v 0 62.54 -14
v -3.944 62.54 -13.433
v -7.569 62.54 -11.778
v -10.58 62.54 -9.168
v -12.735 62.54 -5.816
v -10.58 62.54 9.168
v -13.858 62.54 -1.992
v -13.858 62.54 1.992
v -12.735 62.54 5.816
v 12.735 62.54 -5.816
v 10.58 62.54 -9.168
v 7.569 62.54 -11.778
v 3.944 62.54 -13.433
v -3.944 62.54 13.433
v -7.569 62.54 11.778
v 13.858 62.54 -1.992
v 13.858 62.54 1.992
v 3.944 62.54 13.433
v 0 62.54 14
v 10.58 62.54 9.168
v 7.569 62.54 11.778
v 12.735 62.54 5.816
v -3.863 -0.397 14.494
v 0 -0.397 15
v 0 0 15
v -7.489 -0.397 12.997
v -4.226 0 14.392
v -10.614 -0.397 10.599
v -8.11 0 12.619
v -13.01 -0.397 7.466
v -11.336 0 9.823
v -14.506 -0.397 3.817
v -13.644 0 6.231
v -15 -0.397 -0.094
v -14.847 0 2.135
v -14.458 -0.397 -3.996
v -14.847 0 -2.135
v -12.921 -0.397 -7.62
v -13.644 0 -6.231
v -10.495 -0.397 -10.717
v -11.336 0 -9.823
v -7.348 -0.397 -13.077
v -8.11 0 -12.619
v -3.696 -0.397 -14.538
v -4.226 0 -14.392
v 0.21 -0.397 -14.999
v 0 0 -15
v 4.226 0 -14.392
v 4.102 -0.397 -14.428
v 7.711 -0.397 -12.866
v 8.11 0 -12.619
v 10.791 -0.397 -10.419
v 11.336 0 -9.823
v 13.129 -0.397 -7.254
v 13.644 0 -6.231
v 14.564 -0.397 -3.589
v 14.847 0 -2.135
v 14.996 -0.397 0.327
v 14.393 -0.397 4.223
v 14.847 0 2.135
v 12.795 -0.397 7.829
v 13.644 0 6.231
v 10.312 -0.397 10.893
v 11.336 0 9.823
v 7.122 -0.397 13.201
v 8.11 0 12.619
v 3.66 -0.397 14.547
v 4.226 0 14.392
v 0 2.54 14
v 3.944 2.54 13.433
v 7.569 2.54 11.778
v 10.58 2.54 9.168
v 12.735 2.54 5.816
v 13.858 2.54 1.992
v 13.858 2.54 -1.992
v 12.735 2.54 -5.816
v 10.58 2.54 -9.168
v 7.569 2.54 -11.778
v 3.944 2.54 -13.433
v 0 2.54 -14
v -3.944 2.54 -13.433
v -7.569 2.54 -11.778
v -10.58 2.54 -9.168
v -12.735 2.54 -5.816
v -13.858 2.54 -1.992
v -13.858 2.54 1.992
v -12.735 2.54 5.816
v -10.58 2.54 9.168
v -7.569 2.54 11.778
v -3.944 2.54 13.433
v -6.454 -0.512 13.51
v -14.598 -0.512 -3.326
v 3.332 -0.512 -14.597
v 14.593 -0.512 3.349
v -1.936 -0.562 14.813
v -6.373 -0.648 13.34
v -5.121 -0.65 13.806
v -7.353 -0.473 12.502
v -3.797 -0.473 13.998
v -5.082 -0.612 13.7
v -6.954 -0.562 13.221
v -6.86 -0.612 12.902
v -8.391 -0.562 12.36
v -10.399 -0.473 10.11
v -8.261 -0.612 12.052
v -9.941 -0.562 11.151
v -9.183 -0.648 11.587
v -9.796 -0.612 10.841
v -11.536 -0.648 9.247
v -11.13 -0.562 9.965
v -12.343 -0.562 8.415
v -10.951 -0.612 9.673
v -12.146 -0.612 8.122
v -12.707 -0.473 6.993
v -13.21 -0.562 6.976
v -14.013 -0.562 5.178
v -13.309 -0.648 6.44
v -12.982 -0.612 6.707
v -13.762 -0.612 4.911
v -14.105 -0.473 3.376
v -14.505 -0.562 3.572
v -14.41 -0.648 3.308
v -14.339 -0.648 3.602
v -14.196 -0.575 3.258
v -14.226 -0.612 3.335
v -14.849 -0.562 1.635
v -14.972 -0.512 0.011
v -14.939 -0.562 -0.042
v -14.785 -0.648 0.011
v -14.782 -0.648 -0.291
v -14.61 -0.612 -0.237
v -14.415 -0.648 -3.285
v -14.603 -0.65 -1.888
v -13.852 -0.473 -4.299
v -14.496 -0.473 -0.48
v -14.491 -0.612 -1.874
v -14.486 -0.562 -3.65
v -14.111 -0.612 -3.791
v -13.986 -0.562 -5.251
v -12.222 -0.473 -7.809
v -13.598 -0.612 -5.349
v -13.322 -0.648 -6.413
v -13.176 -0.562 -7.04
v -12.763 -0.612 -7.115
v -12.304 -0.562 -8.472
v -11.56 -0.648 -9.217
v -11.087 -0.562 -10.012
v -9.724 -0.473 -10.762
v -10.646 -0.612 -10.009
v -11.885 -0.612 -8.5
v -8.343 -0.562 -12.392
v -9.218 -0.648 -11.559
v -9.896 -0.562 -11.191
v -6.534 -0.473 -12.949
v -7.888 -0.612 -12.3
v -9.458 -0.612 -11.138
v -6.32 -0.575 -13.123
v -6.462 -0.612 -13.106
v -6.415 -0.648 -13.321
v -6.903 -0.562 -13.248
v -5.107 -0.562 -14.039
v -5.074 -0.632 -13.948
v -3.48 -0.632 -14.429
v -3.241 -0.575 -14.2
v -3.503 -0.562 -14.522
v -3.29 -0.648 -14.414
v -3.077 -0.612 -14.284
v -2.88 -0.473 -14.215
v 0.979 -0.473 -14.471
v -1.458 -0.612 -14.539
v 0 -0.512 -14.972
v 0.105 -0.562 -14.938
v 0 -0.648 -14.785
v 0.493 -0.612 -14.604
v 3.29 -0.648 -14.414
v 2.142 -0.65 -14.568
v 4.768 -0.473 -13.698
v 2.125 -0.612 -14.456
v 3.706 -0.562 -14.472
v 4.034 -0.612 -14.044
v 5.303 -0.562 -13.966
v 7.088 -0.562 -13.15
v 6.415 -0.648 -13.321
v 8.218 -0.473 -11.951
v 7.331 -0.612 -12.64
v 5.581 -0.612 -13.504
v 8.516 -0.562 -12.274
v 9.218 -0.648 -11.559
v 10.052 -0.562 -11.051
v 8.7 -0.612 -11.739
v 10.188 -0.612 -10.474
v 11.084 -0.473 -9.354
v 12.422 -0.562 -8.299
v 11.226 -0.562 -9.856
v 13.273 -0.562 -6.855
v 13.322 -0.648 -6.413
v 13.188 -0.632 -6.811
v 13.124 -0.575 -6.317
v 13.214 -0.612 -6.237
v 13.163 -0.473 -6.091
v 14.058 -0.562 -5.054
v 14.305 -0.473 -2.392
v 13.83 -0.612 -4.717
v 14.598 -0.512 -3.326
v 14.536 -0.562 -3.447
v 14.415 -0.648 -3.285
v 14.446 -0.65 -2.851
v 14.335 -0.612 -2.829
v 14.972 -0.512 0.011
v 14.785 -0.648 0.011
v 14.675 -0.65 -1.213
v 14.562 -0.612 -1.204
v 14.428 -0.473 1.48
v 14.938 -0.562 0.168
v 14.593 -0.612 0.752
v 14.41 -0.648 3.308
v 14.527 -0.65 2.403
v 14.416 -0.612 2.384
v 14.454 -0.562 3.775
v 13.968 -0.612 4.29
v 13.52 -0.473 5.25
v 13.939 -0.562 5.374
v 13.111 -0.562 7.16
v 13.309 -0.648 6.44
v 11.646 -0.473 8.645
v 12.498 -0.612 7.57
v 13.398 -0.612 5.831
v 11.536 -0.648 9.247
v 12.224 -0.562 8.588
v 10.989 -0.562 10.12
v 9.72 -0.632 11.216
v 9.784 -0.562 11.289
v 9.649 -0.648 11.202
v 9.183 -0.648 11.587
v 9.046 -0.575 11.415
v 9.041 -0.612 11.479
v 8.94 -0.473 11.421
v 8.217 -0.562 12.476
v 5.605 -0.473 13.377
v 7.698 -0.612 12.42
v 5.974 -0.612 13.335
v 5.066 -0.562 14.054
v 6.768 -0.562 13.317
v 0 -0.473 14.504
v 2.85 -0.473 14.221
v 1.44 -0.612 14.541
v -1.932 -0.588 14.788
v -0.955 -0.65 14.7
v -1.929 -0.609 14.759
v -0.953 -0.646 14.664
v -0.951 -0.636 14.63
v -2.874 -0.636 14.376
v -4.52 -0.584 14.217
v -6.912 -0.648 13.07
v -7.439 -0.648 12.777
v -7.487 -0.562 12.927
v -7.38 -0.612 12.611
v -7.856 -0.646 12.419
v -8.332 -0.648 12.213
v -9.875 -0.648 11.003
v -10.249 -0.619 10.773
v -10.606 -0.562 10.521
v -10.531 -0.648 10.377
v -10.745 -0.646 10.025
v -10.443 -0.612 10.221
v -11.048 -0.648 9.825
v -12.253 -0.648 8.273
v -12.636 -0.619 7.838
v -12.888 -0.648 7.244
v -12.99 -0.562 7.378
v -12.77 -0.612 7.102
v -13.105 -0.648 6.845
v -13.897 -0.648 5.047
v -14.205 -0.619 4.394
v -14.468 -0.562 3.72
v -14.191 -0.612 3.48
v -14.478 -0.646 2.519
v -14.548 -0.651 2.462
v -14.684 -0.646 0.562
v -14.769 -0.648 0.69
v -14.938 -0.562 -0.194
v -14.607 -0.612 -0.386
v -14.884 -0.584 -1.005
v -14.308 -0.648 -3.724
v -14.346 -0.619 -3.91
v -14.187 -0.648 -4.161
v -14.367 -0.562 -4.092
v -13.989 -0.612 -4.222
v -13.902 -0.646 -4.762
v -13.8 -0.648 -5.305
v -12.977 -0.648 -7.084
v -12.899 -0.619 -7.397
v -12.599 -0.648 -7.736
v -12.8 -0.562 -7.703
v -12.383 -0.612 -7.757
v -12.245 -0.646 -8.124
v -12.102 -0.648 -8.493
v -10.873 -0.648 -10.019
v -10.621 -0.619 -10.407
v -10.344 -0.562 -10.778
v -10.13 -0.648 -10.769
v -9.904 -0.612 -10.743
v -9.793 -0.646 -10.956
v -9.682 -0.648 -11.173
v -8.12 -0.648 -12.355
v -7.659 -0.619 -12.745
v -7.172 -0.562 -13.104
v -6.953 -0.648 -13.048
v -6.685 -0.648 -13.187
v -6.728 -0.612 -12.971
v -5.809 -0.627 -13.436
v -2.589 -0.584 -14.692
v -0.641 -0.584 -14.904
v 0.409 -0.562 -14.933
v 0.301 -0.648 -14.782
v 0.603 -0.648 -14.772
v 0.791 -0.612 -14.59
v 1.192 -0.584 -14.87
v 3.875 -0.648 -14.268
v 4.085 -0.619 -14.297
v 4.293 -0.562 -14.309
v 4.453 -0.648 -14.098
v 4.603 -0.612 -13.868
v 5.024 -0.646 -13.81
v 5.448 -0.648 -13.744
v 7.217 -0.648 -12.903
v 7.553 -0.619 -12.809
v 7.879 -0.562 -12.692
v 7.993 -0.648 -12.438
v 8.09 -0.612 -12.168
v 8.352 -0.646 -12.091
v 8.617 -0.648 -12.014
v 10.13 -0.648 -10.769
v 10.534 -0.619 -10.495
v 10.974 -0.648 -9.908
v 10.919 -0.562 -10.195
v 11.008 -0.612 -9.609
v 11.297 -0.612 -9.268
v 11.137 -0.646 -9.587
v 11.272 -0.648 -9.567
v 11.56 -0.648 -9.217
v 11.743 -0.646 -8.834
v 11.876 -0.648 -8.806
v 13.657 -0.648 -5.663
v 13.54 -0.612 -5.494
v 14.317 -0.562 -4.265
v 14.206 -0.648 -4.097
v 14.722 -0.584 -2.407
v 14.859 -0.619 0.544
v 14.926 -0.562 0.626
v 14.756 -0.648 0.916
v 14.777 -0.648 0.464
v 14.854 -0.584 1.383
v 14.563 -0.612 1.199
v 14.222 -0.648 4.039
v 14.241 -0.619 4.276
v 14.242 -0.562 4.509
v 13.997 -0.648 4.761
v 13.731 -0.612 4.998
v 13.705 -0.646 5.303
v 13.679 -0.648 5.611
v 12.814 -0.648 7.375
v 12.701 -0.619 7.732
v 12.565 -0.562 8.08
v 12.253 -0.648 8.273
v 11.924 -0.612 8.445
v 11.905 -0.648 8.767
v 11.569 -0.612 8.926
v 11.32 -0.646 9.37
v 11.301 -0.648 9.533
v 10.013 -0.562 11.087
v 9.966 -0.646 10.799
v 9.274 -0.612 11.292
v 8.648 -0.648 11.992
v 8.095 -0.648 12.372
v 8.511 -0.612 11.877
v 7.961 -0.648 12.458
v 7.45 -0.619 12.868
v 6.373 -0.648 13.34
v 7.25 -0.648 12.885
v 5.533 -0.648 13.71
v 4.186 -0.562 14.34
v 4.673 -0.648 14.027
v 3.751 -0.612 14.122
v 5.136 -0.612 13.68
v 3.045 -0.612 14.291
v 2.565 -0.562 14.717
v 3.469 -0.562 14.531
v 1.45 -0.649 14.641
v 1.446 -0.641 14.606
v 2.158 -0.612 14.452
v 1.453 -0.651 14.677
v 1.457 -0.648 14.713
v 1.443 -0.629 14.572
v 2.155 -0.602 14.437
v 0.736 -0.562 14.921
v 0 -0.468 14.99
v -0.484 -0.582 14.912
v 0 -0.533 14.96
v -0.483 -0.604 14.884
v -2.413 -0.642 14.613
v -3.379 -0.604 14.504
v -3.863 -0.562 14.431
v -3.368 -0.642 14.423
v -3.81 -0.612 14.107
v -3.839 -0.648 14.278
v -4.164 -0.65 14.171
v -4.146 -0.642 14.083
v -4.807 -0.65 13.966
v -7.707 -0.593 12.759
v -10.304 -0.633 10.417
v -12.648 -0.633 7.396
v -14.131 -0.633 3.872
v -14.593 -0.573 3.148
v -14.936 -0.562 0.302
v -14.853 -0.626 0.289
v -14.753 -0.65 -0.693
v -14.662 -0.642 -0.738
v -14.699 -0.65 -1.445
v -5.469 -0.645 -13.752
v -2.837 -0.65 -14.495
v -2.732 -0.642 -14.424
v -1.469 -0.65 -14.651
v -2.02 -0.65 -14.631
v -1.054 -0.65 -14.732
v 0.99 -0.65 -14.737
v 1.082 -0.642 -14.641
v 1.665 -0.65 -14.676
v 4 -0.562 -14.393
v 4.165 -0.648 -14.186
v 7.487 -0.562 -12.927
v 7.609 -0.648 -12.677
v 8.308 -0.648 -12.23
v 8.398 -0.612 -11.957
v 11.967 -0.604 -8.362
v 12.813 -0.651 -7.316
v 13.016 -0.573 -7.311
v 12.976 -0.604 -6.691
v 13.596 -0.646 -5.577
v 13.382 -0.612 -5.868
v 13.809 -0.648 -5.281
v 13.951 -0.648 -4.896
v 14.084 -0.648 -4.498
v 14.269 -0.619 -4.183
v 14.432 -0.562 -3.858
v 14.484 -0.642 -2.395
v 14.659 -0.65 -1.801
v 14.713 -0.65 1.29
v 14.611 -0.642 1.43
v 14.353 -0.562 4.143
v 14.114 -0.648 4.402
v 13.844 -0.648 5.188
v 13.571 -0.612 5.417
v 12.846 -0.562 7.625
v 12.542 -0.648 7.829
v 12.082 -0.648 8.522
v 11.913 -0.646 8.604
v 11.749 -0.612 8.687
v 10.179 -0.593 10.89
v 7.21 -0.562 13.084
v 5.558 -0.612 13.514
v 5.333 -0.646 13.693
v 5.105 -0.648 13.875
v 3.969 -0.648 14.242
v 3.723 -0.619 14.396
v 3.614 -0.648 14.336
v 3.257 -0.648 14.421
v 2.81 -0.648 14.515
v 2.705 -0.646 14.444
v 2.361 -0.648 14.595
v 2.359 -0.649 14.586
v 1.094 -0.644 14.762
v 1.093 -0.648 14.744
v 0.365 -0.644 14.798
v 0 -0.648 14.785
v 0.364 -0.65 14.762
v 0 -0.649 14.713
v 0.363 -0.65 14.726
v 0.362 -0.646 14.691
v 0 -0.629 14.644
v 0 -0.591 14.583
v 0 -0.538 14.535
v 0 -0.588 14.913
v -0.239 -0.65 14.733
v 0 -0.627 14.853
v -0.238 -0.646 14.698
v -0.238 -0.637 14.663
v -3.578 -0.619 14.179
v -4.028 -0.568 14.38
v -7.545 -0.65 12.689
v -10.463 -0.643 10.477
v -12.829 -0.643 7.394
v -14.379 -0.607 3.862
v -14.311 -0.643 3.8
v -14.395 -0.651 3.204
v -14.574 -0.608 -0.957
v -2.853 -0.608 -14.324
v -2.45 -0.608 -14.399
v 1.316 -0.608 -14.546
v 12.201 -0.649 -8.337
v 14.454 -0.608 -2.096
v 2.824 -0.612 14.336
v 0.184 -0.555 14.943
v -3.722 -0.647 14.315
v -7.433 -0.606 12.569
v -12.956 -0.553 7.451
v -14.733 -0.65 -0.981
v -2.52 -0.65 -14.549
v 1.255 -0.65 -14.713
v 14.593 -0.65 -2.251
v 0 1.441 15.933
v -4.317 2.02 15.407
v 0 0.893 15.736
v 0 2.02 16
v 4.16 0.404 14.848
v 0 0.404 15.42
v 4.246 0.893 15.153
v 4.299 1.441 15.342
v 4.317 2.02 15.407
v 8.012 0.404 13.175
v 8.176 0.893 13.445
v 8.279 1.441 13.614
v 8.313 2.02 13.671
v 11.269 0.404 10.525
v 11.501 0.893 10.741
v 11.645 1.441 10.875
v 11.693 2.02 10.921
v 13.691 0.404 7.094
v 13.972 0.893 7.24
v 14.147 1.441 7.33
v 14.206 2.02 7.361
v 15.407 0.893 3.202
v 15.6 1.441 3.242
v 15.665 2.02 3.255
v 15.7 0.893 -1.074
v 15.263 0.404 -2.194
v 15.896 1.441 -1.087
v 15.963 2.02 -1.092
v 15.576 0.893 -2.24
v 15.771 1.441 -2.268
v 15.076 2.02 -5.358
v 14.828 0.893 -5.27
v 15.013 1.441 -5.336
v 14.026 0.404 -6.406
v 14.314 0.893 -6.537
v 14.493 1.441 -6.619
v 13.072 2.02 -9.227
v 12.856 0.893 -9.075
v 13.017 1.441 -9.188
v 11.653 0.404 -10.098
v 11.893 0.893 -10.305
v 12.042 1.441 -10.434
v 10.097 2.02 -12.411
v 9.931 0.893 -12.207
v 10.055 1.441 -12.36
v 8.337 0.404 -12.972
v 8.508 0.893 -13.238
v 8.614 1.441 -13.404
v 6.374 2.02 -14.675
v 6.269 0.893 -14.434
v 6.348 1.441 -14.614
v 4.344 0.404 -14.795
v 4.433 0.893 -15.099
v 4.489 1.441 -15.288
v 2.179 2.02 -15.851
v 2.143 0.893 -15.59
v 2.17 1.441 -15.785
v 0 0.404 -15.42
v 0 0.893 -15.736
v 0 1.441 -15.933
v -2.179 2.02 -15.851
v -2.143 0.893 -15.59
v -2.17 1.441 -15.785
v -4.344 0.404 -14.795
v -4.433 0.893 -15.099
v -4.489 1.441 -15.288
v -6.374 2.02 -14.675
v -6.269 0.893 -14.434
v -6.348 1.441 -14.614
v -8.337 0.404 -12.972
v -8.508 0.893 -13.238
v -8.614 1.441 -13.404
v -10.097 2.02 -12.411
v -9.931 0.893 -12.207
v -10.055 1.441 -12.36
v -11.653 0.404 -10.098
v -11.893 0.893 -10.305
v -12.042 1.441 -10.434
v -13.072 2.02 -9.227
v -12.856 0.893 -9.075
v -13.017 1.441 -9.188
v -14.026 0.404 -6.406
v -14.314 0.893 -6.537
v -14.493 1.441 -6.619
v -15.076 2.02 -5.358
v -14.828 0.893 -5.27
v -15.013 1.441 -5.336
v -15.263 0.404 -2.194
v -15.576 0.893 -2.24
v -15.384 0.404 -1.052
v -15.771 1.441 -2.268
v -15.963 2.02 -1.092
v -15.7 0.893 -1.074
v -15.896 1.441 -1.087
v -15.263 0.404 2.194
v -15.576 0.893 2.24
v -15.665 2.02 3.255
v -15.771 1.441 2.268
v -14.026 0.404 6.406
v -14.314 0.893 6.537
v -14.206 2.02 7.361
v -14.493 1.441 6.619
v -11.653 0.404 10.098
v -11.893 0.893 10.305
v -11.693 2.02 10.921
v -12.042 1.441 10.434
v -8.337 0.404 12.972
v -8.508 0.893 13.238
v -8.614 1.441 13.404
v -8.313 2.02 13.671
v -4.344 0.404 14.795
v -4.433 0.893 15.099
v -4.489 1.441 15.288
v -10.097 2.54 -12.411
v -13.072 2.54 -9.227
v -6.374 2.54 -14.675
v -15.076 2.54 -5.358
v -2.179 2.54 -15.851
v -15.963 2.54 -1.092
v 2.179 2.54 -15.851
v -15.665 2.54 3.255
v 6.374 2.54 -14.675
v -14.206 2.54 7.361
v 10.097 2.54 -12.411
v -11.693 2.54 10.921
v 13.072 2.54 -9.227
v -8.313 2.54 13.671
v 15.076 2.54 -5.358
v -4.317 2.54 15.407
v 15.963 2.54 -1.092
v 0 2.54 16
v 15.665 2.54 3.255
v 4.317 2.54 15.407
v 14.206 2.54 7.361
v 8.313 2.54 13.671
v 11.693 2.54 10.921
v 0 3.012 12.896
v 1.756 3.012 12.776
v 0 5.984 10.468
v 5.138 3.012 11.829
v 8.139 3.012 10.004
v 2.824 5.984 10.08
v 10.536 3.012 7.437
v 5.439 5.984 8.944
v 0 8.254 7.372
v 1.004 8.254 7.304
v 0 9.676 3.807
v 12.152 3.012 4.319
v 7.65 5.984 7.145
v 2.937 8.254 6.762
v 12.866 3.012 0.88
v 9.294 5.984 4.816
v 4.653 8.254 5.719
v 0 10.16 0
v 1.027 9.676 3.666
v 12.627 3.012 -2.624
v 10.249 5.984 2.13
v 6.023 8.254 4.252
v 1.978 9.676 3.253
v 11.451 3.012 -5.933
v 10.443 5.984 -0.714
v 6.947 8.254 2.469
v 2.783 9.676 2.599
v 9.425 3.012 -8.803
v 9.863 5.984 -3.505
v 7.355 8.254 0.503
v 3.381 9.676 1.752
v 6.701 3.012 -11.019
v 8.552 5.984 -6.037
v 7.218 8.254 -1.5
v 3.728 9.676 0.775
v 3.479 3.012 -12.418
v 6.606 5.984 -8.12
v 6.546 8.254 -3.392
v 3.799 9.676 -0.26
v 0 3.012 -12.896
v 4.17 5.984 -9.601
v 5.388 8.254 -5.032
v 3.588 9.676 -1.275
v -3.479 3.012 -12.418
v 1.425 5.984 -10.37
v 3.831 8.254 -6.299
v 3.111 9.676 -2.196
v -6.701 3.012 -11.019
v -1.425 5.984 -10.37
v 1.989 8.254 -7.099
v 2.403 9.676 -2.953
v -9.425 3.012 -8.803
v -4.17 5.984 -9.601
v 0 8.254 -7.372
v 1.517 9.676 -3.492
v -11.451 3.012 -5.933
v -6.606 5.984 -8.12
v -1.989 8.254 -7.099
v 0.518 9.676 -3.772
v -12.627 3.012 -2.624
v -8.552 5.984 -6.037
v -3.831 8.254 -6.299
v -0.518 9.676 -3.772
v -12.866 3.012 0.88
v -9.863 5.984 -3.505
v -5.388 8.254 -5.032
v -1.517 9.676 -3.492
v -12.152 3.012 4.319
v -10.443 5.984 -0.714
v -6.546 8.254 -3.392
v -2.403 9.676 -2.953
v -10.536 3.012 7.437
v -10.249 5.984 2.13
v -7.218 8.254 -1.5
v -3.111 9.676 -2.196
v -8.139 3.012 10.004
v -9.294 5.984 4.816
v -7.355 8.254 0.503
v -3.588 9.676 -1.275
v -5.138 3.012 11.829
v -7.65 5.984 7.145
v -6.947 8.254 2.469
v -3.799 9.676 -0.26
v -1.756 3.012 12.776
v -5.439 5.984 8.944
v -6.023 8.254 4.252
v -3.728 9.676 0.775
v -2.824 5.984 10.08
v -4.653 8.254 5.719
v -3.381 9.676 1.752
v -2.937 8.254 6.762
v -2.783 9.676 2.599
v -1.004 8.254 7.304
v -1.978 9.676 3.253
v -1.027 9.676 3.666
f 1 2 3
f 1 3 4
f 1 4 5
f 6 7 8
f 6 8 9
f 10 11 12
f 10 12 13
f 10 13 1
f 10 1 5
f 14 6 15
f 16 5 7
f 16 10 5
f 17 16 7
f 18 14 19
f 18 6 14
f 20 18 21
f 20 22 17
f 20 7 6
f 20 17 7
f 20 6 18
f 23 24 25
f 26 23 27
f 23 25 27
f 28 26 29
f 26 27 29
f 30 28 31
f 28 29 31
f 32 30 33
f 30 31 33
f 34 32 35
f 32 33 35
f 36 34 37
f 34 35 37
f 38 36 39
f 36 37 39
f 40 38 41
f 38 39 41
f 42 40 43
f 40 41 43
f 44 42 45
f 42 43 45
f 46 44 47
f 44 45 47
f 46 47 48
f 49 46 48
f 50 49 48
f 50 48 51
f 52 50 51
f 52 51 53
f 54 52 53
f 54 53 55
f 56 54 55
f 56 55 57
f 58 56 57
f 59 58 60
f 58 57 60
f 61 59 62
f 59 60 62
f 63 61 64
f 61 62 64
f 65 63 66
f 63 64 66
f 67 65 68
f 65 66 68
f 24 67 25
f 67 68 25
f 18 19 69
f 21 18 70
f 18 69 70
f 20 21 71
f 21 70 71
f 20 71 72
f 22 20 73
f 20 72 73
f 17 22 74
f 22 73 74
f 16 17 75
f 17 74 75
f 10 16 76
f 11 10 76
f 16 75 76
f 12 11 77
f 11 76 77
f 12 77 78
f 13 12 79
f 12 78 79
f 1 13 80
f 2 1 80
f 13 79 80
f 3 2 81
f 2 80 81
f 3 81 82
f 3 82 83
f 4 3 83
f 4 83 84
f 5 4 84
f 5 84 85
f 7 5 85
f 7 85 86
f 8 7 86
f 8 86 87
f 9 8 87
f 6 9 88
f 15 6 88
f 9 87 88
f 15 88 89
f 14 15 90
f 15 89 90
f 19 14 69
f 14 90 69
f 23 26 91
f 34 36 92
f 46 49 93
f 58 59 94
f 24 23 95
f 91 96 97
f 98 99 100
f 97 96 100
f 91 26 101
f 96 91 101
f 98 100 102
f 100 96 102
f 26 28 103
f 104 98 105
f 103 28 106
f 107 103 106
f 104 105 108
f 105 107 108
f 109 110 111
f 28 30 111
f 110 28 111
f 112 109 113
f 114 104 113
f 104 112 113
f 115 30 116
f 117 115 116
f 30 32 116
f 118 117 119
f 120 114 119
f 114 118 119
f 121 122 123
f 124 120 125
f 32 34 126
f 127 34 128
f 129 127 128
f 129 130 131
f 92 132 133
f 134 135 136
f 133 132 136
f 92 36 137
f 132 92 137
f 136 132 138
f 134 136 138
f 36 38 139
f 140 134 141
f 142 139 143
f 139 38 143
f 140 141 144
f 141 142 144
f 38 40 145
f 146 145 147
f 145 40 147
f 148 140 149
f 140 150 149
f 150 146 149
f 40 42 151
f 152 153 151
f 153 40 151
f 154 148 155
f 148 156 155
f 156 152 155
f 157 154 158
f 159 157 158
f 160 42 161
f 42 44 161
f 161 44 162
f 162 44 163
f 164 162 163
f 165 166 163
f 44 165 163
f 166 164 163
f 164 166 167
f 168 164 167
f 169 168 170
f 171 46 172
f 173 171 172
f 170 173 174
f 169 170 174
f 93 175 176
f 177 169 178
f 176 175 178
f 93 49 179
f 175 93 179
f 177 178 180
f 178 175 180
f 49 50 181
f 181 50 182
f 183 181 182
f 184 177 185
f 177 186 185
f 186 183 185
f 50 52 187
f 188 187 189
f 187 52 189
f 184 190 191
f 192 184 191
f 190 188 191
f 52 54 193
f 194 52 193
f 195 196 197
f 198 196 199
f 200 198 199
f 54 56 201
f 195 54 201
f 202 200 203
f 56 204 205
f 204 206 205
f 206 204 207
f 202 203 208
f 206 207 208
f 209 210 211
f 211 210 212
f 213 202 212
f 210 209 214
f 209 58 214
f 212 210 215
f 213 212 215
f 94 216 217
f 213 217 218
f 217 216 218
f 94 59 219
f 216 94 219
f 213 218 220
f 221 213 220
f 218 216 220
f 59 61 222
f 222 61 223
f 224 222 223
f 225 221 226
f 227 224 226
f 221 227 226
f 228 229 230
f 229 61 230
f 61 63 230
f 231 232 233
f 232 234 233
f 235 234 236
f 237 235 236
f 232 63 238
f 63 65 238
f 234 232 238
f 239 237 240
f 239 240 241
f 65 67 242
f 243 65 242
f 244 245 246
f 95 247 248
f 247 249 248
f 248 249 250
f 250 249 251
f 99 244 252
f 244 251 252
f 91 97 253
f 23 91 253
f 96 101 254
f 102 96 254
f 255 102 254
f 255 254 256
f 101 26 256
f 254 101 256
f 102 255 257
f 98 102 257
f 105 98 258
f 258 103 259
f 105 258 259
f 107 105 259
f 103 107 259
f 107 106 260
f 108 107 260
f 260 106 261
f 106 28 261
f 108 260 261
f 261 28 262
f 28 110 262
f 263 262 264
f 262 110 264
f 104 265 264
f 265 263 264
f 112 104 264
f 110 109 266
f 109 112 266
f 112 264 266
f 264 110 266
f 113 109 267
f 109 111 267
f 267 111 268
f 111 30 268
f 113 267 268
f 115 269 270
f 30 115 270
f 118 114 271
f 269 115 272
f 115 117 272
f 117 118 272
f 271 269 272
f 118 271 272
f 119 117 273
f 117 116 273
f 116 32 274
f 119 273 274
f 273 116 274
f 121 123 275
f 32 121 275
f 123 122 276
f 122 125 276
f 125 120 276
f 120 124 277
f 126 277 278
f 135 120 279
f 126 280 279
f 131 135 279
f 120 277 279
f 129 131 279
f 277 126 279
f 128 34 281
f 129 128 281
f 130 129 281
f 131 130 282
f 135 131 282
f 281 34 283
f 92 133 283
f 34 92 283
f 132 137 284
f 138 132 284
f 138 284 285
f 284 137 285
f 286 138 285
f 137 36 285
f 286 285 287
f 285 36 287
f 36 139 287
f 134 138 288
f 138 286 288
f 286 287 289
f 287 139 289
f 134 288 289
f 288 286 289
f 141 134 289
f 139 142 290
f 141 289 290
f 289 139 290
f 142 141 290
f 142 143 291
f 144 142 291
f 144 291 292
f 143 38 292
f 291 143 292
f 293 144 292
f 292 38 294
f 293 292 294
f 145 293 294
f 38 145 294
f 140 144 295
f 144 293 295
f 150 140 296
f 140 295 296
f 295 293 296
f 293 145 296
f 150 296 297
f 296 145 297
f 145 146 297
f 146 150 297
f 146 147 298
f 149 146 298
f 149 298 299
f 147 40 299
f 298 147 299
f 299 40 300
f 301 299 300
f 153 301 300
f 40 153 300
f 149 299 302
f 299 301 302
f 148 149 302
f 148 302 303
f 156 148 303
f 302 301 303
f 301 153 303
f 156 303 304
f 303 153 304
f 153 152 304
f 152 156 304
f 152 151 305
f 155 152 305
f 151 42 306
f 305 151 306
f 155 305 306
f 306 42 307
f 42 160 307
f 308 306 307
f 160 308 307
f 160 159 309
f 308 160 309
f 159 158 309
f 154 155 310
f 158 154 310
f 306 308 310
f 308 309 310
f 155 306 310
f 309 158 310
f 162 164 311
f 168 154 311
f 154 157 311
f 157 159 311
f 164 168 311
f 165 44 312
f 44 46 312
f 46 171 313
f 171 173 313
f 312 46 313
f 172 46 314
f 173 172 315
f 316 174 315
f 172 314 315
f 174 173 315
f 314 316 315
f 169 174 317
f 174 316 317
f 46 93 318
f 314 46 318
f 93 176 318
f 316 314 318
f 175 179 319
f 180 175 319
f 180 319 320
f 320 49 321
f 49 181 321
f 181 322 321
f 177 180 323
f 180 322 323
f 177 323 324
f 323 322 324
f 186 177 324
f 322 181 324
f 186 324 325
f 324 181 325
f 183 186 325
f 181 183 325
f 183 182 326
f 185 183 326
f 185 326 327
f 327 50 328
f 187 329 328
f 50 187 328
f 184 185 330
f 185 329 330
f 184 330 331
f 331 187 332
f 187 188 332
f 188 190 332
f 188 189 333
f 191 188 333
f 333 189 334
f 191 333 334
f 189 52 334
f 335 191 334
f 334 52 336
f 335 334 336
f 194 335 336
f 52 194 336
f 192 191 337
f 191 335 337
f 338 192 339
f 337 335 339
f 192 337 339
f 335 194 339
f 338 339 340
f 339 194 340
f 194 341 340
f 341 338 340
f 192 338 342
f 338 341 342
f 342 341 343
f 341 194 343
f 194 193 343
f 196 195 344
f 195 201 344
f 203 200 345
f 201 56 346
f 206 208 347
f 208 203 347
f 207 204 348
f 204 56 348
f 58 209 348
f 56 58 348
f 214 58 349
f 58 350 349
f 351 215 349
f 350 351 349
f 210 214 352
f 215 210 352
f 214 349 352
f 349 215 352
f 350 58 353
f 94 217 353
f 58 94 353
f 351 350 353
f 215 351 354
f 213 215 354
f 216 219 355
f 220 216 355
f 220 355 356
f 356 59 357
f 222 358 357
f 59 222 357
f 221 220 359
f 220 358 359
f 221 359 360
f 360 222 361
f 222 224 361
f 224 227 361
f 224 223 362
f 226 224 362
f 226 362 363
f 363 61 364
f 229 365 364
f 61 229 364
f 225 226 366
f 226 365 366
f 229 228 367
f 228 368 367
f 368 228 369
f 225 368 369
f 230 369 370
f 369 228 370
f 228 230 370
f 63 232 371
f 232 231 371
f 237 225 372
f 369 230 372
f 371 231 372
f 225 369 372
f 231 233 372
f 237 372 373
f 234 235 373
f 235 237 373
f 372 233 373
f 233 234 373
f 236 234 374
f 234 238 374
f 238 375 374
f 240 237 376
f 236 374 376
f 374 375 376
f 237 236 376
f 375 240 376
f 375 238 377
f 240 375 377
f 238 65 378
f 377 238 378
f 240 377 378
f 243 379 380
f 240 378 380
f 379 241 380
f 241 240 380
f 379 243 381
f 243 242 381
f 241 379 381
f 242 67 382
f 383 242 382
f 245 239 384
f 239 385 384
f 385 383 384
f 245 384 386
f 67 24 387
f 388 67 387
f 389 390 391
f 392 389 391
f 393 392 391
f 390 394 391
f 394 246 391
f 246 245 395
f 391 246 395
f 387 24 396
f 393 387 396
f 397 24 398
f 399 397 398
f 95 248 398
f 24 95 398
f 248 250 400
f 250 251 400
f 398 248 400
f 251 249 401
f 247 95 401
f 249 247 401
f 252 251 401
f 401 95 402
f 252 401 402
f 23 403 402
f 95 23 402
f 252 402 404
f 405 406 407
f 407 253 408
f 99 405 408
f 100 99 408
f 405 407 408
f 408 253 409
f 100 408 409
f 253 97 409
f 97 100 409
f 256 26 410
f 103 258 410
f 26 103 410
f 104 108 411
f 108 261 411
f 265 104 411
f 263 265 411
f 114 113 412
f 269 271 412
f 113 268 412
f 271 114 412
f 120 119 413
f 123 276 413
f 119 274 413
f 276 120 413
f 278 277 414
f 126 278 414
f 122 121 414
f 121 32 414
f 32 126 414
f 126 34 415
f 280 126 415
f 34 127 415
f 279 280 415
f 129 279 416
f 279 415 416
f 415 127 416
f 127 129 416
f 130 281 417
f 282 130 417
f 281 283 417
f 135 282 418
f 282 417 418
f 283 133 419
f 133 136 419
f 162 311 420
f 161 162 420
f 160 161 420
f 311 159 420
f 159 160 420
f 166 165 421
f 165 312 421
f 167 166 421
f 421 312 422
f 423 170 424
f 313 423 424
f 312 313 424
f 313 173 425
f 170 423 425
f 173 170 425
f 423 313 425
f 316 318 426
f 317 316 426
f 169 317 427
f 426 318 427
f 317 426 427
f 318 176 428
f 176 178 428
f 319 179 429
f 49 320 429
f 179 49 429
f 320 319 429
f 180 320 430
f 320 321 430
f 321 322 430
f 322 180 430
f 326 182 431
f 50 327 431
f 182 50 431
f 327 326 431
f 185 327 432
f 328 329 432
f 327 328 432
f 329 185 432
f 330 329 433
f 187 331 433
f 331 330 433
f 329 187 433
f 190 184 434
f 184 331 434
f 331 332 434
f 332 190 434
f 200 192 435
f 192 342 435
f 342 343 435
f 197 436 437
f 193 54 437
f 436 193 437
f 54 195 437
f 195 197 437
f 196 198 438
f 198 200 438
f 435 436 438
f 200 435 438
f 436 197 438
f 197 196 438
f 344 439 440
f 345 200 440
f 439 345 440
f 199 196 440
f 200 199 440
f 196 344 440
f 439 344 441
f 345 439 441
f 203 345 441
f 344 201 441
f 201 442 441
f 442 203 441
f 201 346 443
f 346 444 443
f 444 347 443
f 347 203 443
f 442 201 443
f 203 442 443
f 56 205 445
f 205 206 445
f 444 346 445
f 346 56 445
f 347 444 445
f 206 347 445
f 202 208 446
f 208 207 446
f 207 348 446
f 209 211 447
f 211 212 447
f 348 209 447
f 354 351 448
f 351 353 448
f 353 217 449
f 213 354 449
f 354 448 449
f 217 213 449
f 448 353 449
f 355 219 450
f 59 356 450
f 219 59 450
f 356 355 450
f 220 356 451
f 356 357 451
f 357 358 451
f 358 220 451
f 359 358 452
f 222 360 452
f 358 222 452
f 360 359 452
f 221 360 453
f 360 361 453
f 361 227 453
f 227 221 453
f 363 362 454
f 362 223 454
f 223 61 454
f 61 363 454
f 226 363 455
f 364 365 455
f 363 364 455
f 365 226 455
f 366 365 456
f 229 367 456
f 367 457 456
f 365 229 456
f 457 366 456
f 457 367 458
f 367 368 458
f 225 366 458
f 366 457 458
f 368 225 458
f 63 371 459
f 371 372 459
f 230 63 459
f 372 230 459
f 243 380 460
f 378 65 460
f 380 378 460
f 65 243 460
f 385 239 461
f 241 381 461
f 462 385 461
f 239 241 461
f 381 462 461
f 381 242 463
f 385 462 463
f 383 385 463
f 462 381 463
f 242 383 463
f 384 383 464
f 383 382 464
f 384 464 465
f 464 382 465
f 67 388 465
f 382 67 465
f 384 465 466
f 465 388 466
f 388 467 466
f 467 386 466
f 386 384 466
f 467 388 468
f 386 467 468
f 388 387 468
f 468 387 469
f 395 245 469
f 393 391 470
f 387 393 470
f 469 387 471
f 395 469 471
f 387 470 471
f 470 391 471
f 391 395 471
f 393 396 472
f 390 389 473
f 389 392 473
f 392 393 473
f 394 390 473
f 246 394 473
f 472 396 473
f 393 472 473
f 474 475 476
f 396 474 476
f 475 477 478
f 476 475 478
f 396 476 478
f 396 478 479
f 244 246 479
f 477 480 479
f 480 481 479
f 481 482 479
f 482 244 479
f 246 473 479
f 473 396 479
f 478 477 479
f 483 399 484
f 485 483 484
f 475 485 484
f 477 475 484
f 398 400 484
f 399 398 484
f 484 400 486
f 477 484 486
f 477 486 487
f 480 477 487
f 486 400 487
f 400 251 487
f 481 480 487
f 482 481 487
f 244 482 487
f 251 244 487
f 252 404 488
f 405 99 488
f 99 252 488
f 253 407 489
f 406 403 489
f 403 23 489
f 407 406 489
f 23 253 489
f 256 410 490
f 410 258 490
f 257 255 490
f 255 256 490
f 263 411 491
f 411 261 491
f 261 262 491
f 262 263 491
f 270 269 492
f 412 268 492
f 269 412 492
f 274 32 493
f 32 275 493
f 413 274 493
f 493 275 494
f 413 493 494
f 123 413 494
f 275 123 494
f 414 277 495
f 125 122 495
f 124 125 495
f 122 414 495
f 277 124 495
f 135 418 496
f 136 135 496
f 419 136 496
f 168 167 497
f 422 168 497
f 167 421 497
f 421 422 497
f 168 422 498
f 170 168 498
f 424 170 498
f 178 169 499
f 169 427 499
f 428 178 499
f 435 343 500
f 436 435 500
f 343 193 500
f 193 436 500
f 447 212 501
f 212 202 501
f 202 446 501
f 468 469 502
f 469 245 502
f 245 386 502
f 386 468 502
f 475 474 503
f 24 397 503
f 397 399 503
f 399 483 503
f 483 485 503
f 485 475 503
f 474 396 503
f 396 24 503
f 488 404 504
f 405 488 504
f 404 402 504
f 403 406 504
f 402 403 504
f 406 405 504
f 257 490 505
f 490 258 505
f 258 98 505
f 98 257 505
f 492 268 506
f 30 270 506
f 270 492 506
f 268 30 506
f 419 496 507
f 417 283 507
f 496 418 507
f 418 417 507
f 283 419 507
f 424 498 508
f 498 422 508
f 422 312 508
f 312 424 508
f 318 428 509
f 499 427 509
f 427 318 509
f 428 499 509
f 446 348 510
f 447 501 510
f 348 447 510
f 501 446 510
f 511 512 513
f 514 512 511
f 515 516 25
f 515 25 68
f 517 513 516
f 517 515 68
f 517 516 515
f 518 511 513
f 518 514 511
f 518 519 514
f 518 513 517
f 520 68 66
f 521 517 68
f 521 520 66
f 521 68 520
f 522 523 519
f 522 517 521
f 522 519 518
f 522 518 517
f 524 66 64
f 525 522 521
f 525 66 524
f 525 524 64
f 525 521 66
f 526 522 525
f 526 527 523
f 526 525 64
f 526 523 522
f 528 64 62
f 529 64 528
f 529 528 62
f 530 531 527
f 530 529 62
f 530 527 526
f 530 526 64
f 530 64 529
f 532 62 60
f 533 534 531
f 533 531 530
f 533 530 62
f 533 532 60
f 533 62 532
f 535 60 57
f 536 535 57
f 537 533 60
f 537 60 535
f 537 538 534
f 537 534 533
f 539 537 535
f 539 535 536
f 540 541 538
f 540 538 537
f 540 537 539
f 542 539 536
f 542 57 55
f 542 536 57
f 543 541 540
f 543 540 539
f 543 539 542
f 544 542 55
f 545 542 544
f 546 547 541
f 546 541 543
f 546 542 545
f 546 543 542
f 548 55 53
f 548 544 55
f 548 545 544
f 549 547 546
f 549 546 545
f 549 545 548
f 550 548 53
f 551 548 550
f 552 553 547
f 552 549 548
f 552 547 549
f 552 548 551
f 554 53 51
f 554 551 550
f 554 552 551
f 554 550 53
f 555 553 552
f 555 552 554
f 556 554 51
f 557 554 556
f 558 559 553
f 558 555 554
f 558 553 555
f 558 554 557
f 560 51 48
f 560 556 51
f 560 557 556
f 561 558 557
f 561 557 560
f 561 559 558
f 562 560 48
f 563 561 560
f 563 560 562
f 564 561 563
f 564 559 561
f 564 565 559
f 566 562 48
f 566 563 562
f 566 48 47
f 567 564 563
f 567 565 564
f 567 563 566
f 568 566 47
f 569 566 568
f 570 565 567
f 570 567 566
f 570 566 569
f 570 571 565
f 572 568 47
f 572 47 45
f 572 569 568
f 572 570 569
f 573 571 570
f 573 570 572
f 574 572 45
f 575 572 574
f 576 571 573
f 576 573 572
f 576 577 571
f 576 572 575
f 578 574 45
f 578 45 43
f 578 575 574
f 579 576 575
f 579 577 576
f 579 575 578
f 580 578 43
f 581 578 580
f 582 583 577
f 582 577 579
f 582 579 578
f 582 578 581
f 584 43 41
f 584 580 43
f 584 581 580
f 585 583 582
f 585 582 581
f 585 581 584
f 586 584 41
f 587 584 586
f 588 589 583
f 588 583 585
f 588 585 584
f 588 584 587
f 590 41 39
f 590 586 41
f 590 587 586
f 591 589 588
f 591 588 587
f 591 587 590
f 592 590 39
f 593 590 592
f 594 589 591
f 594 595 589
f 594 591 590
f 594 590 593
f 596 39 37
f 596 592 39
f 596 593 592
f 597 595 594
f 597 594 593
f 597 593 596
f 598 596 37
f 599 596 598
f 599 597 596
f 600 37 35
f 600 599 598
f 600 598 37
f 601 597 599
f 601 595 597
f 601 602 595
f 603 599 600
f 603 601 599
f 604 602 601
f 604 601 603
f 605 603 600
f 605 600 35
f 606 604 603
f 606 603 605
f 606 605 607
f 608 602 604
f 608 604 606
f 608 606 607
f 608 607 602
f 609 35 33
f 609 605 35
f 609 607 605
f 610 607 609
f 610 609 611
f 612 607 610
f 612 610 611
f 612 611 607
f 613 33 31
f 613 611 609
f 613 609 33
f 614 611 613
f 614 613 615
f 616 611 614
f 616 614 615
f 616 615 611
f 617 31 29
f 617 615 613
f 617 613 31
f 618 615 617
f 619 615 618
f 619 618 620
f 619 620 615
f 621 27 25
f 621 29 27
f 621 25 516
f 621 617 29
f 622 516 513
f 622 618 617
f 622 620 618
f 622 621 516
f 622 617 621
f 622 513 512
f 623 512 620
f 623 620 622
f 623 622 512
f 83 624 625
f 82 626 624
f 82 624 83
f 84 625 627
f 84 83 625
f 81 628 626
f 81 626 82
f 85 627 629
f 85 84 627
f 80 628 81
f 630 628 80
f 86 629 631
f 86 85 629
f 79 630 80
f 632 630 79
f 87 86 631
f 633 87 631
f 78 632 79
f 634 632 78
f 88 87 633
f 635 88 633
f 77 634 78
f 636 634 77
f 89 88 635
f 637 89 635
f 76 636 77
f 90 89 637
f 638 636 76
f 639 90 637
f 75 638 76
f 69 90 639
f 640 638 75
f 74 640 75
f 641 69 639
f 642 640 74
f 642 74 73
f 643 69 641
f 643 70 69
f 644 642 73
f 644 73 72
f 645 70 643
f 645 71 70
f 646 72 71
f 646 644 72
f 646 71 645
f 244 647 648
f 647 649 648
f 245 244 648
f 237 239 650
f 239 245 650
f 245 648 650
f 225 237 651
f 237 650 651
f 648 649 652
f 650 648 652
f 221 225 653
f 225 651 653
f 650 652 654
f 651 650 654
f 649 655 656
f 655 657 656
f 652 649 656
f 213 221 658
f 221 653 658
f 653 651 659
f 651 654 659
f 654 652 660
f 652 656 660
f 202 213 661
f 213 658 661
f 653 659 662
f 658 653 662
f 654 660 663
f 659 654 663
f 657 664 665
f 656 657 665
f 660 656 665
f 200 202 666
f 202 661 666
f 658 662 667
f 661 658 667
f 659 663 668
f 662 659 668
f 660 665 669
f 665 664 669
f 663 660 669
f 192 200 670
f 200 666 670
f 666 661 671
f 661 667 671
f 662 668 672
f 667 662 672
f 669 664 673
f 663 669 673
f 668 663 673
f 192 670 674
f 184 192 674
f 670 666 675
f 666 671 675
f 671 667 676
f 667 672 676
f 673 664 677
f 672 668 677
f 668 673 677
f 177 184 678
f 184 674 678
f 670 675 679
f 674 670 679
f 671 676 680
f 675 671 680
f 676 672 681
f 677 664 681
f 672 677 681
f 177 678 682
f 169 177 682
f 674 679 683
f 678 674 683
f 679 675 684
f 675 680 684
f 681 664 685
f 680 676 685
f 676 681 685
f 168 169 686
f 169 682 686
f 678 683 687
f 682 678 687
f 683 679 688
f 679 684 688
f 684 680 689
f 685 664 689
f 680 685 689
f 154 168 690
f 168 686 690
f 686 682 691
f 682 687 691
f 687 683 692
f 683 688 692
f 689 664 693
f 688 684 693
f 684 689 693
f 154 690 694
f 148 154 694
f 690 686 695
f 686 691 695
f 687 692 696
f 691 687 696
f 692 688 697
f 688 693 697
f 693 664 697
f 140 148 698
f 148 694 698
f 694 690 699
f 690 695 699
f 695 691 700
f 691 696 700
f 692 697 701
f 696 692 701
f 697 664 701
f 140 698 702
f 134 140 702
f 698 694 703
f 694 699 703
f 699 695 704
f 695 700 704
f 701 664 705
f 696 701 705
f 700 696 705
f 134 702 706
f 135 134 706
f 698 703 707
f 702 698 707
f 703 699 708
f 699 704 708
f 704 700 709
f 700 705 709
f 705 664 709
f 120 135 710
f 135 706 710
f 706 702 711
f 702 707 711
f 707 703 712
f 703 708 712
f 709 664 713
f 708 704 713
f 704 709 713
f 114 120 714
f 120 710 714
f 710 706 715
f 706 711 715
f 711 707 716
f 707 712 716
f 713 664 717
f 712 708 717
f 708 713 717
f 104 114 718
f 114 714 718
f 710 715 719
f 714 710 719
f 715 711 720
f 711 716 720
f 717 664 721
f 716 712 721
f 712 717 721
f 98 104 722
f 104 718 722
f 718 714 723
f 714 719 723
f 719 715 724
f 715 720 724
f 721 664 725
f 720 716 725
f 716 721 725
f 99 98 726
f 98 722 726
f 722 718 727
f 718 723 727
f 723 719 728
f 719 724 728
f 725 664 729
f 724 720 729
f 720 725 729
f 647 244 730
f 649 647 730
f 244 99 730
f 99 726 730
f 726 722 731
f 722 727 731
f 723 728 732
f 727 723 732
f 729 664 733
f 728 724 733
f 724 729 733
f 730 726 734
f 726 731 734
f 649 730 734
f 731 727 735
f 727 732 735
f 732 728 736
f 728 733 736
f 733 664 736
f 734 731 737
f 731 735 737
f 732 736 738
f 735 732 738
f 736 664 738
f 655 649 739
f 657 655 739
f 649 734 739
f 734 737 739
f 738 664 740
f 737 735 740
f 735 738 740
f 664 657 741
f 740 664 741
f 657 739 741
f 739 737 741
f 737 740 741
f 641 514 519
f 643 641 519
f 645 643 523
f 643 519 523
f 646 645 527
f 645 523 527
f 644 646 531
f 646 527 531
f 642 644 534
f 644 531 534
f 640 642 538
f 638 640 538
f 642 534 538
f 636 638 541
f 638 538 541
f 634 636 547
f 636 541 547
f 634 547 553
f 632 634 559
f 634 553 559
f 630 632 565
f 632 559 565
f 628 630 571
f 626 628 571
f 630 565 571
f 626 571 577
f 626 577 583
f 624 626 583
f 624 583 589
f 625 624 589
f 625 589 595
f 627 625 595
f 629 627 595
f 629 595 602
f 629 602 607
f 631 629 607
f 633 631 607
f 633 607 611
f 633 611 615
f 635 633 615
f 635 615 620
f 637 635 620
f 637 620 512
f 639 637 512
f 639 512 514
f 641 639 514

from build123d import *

# Parameters (mm, degrees)
SKETCH1_R           = 16
BOSS_EXTRUDE1_DEPTH = 2.54
SKETCH2_R           = 14
BOSS_EXTRUDE2_DEPTH = 60
SKETCH3_R           = 15
BOSS_EXTRUDE3_DEPTH = 2.54
DOME1_FACE_RADIUS   = 15
DOME1_HEIGHT        = 12.7
FILLET1_R           = 2.54
FILLET2_R           = 0.254


with BuildPart() as part:
    # Sketch1 → Boss-Extrude1 (new body)
    with BuildSketch(Plane(origin=(0, 0, 0), x_dir=(1, 0, 0), z_dir=(0, 1, 0))):
        with Locations(Location((0, 0, 0), (0, 0, 270))):
            Circle(SKETCH1_R)
    extrude(amount=BOSS_EXTRUDE1_DEPTH)

    # Sketch2 → Boss-Extrude2 (add)
    with BuildSketch(Plane(origin=(0, 2.54, 0), x_dir=(1, 0, 0), z_dir=(0, 1, 0))):
        with Locations(Location((0, 0, 0), (0, 0, 270))):
            Circle(SKETCH2_R)
    extrude(amount=BOSS_EXTRUDE2_DEPTH)

    # Sketch3 → Boss-Extrude3 (add)
    with BuildSketch(Plane.XZ):
        with Locations(Location((0, 0, 0), (0, 0, 90))):
            Circle(SKETCH3_R)
    extrude(amount=BOSS_EXTRUDE3_DEPTH)

    # Dome1: a dome of height H over a round flat face of radius A is a cap of a sphere of radius (A * A + H * H) / (2 * H)
    dome1_r = (DOME1_FACE_RADIUS * DOME1_FACE_RADIUS + DOME1_HEIGHT * DOME1_HEIGHT) / (2 * DOME1_HEIGHT)
    dome1_base = Plane((0, -2.54, 0), z_dir=(0, 1, 0))
    with Locations(dome1_base.offset(DOME1_HEIGHT - dome1_r)):
        dome1_ball = Sphere(dome1_r, mode=Mode.PRIVATE)
    add(split(dome1_ball, bisect_by=dome1_base, keep=Keep.TOP, mode=Mode.PRIVATE), mode=Mode.SUBTRACT)

    # Fillet1
    # the kernel refuses this fillet: 2.54 mm, written as the material it takes off along each edge
    with BuildSketch(Plane(origin=(0, 0, 0), x_dir=(0, 0, 1), z_dir=(-1, 0, 0))) as fillet1_piece_1:
        with BuildLine():
            CenterArc((13.46, 2.019900988), FILLET1_R, 307.322390296, 52.677609704)
            Line((15, 0), (15.0308, -0.04039802))
            ThreePointArc((15.0308, -0.04039802), (15.5, -0.0508), (16, -0.0508))
            Line((16, -0.0508), (16.0508, 0))
            Line((16.0508, 0), (16.0508, 2.019900988))
            Line((16.0508, 2.019900988), (16, 2.019900988))
        make_face()
    revolve(axis=Axis((0, 0, 0), (0, 1, 0)), mode=Mode.SUBTRACT)

    # Fillet2
    fillet2_edges = [part.edges().sort_by_distance(p)[0] for p in [
        (0, -2.54, -15),
    ]]
    fillet(fillet2_edges, radius=FILLET2_R)


solid = part.part
